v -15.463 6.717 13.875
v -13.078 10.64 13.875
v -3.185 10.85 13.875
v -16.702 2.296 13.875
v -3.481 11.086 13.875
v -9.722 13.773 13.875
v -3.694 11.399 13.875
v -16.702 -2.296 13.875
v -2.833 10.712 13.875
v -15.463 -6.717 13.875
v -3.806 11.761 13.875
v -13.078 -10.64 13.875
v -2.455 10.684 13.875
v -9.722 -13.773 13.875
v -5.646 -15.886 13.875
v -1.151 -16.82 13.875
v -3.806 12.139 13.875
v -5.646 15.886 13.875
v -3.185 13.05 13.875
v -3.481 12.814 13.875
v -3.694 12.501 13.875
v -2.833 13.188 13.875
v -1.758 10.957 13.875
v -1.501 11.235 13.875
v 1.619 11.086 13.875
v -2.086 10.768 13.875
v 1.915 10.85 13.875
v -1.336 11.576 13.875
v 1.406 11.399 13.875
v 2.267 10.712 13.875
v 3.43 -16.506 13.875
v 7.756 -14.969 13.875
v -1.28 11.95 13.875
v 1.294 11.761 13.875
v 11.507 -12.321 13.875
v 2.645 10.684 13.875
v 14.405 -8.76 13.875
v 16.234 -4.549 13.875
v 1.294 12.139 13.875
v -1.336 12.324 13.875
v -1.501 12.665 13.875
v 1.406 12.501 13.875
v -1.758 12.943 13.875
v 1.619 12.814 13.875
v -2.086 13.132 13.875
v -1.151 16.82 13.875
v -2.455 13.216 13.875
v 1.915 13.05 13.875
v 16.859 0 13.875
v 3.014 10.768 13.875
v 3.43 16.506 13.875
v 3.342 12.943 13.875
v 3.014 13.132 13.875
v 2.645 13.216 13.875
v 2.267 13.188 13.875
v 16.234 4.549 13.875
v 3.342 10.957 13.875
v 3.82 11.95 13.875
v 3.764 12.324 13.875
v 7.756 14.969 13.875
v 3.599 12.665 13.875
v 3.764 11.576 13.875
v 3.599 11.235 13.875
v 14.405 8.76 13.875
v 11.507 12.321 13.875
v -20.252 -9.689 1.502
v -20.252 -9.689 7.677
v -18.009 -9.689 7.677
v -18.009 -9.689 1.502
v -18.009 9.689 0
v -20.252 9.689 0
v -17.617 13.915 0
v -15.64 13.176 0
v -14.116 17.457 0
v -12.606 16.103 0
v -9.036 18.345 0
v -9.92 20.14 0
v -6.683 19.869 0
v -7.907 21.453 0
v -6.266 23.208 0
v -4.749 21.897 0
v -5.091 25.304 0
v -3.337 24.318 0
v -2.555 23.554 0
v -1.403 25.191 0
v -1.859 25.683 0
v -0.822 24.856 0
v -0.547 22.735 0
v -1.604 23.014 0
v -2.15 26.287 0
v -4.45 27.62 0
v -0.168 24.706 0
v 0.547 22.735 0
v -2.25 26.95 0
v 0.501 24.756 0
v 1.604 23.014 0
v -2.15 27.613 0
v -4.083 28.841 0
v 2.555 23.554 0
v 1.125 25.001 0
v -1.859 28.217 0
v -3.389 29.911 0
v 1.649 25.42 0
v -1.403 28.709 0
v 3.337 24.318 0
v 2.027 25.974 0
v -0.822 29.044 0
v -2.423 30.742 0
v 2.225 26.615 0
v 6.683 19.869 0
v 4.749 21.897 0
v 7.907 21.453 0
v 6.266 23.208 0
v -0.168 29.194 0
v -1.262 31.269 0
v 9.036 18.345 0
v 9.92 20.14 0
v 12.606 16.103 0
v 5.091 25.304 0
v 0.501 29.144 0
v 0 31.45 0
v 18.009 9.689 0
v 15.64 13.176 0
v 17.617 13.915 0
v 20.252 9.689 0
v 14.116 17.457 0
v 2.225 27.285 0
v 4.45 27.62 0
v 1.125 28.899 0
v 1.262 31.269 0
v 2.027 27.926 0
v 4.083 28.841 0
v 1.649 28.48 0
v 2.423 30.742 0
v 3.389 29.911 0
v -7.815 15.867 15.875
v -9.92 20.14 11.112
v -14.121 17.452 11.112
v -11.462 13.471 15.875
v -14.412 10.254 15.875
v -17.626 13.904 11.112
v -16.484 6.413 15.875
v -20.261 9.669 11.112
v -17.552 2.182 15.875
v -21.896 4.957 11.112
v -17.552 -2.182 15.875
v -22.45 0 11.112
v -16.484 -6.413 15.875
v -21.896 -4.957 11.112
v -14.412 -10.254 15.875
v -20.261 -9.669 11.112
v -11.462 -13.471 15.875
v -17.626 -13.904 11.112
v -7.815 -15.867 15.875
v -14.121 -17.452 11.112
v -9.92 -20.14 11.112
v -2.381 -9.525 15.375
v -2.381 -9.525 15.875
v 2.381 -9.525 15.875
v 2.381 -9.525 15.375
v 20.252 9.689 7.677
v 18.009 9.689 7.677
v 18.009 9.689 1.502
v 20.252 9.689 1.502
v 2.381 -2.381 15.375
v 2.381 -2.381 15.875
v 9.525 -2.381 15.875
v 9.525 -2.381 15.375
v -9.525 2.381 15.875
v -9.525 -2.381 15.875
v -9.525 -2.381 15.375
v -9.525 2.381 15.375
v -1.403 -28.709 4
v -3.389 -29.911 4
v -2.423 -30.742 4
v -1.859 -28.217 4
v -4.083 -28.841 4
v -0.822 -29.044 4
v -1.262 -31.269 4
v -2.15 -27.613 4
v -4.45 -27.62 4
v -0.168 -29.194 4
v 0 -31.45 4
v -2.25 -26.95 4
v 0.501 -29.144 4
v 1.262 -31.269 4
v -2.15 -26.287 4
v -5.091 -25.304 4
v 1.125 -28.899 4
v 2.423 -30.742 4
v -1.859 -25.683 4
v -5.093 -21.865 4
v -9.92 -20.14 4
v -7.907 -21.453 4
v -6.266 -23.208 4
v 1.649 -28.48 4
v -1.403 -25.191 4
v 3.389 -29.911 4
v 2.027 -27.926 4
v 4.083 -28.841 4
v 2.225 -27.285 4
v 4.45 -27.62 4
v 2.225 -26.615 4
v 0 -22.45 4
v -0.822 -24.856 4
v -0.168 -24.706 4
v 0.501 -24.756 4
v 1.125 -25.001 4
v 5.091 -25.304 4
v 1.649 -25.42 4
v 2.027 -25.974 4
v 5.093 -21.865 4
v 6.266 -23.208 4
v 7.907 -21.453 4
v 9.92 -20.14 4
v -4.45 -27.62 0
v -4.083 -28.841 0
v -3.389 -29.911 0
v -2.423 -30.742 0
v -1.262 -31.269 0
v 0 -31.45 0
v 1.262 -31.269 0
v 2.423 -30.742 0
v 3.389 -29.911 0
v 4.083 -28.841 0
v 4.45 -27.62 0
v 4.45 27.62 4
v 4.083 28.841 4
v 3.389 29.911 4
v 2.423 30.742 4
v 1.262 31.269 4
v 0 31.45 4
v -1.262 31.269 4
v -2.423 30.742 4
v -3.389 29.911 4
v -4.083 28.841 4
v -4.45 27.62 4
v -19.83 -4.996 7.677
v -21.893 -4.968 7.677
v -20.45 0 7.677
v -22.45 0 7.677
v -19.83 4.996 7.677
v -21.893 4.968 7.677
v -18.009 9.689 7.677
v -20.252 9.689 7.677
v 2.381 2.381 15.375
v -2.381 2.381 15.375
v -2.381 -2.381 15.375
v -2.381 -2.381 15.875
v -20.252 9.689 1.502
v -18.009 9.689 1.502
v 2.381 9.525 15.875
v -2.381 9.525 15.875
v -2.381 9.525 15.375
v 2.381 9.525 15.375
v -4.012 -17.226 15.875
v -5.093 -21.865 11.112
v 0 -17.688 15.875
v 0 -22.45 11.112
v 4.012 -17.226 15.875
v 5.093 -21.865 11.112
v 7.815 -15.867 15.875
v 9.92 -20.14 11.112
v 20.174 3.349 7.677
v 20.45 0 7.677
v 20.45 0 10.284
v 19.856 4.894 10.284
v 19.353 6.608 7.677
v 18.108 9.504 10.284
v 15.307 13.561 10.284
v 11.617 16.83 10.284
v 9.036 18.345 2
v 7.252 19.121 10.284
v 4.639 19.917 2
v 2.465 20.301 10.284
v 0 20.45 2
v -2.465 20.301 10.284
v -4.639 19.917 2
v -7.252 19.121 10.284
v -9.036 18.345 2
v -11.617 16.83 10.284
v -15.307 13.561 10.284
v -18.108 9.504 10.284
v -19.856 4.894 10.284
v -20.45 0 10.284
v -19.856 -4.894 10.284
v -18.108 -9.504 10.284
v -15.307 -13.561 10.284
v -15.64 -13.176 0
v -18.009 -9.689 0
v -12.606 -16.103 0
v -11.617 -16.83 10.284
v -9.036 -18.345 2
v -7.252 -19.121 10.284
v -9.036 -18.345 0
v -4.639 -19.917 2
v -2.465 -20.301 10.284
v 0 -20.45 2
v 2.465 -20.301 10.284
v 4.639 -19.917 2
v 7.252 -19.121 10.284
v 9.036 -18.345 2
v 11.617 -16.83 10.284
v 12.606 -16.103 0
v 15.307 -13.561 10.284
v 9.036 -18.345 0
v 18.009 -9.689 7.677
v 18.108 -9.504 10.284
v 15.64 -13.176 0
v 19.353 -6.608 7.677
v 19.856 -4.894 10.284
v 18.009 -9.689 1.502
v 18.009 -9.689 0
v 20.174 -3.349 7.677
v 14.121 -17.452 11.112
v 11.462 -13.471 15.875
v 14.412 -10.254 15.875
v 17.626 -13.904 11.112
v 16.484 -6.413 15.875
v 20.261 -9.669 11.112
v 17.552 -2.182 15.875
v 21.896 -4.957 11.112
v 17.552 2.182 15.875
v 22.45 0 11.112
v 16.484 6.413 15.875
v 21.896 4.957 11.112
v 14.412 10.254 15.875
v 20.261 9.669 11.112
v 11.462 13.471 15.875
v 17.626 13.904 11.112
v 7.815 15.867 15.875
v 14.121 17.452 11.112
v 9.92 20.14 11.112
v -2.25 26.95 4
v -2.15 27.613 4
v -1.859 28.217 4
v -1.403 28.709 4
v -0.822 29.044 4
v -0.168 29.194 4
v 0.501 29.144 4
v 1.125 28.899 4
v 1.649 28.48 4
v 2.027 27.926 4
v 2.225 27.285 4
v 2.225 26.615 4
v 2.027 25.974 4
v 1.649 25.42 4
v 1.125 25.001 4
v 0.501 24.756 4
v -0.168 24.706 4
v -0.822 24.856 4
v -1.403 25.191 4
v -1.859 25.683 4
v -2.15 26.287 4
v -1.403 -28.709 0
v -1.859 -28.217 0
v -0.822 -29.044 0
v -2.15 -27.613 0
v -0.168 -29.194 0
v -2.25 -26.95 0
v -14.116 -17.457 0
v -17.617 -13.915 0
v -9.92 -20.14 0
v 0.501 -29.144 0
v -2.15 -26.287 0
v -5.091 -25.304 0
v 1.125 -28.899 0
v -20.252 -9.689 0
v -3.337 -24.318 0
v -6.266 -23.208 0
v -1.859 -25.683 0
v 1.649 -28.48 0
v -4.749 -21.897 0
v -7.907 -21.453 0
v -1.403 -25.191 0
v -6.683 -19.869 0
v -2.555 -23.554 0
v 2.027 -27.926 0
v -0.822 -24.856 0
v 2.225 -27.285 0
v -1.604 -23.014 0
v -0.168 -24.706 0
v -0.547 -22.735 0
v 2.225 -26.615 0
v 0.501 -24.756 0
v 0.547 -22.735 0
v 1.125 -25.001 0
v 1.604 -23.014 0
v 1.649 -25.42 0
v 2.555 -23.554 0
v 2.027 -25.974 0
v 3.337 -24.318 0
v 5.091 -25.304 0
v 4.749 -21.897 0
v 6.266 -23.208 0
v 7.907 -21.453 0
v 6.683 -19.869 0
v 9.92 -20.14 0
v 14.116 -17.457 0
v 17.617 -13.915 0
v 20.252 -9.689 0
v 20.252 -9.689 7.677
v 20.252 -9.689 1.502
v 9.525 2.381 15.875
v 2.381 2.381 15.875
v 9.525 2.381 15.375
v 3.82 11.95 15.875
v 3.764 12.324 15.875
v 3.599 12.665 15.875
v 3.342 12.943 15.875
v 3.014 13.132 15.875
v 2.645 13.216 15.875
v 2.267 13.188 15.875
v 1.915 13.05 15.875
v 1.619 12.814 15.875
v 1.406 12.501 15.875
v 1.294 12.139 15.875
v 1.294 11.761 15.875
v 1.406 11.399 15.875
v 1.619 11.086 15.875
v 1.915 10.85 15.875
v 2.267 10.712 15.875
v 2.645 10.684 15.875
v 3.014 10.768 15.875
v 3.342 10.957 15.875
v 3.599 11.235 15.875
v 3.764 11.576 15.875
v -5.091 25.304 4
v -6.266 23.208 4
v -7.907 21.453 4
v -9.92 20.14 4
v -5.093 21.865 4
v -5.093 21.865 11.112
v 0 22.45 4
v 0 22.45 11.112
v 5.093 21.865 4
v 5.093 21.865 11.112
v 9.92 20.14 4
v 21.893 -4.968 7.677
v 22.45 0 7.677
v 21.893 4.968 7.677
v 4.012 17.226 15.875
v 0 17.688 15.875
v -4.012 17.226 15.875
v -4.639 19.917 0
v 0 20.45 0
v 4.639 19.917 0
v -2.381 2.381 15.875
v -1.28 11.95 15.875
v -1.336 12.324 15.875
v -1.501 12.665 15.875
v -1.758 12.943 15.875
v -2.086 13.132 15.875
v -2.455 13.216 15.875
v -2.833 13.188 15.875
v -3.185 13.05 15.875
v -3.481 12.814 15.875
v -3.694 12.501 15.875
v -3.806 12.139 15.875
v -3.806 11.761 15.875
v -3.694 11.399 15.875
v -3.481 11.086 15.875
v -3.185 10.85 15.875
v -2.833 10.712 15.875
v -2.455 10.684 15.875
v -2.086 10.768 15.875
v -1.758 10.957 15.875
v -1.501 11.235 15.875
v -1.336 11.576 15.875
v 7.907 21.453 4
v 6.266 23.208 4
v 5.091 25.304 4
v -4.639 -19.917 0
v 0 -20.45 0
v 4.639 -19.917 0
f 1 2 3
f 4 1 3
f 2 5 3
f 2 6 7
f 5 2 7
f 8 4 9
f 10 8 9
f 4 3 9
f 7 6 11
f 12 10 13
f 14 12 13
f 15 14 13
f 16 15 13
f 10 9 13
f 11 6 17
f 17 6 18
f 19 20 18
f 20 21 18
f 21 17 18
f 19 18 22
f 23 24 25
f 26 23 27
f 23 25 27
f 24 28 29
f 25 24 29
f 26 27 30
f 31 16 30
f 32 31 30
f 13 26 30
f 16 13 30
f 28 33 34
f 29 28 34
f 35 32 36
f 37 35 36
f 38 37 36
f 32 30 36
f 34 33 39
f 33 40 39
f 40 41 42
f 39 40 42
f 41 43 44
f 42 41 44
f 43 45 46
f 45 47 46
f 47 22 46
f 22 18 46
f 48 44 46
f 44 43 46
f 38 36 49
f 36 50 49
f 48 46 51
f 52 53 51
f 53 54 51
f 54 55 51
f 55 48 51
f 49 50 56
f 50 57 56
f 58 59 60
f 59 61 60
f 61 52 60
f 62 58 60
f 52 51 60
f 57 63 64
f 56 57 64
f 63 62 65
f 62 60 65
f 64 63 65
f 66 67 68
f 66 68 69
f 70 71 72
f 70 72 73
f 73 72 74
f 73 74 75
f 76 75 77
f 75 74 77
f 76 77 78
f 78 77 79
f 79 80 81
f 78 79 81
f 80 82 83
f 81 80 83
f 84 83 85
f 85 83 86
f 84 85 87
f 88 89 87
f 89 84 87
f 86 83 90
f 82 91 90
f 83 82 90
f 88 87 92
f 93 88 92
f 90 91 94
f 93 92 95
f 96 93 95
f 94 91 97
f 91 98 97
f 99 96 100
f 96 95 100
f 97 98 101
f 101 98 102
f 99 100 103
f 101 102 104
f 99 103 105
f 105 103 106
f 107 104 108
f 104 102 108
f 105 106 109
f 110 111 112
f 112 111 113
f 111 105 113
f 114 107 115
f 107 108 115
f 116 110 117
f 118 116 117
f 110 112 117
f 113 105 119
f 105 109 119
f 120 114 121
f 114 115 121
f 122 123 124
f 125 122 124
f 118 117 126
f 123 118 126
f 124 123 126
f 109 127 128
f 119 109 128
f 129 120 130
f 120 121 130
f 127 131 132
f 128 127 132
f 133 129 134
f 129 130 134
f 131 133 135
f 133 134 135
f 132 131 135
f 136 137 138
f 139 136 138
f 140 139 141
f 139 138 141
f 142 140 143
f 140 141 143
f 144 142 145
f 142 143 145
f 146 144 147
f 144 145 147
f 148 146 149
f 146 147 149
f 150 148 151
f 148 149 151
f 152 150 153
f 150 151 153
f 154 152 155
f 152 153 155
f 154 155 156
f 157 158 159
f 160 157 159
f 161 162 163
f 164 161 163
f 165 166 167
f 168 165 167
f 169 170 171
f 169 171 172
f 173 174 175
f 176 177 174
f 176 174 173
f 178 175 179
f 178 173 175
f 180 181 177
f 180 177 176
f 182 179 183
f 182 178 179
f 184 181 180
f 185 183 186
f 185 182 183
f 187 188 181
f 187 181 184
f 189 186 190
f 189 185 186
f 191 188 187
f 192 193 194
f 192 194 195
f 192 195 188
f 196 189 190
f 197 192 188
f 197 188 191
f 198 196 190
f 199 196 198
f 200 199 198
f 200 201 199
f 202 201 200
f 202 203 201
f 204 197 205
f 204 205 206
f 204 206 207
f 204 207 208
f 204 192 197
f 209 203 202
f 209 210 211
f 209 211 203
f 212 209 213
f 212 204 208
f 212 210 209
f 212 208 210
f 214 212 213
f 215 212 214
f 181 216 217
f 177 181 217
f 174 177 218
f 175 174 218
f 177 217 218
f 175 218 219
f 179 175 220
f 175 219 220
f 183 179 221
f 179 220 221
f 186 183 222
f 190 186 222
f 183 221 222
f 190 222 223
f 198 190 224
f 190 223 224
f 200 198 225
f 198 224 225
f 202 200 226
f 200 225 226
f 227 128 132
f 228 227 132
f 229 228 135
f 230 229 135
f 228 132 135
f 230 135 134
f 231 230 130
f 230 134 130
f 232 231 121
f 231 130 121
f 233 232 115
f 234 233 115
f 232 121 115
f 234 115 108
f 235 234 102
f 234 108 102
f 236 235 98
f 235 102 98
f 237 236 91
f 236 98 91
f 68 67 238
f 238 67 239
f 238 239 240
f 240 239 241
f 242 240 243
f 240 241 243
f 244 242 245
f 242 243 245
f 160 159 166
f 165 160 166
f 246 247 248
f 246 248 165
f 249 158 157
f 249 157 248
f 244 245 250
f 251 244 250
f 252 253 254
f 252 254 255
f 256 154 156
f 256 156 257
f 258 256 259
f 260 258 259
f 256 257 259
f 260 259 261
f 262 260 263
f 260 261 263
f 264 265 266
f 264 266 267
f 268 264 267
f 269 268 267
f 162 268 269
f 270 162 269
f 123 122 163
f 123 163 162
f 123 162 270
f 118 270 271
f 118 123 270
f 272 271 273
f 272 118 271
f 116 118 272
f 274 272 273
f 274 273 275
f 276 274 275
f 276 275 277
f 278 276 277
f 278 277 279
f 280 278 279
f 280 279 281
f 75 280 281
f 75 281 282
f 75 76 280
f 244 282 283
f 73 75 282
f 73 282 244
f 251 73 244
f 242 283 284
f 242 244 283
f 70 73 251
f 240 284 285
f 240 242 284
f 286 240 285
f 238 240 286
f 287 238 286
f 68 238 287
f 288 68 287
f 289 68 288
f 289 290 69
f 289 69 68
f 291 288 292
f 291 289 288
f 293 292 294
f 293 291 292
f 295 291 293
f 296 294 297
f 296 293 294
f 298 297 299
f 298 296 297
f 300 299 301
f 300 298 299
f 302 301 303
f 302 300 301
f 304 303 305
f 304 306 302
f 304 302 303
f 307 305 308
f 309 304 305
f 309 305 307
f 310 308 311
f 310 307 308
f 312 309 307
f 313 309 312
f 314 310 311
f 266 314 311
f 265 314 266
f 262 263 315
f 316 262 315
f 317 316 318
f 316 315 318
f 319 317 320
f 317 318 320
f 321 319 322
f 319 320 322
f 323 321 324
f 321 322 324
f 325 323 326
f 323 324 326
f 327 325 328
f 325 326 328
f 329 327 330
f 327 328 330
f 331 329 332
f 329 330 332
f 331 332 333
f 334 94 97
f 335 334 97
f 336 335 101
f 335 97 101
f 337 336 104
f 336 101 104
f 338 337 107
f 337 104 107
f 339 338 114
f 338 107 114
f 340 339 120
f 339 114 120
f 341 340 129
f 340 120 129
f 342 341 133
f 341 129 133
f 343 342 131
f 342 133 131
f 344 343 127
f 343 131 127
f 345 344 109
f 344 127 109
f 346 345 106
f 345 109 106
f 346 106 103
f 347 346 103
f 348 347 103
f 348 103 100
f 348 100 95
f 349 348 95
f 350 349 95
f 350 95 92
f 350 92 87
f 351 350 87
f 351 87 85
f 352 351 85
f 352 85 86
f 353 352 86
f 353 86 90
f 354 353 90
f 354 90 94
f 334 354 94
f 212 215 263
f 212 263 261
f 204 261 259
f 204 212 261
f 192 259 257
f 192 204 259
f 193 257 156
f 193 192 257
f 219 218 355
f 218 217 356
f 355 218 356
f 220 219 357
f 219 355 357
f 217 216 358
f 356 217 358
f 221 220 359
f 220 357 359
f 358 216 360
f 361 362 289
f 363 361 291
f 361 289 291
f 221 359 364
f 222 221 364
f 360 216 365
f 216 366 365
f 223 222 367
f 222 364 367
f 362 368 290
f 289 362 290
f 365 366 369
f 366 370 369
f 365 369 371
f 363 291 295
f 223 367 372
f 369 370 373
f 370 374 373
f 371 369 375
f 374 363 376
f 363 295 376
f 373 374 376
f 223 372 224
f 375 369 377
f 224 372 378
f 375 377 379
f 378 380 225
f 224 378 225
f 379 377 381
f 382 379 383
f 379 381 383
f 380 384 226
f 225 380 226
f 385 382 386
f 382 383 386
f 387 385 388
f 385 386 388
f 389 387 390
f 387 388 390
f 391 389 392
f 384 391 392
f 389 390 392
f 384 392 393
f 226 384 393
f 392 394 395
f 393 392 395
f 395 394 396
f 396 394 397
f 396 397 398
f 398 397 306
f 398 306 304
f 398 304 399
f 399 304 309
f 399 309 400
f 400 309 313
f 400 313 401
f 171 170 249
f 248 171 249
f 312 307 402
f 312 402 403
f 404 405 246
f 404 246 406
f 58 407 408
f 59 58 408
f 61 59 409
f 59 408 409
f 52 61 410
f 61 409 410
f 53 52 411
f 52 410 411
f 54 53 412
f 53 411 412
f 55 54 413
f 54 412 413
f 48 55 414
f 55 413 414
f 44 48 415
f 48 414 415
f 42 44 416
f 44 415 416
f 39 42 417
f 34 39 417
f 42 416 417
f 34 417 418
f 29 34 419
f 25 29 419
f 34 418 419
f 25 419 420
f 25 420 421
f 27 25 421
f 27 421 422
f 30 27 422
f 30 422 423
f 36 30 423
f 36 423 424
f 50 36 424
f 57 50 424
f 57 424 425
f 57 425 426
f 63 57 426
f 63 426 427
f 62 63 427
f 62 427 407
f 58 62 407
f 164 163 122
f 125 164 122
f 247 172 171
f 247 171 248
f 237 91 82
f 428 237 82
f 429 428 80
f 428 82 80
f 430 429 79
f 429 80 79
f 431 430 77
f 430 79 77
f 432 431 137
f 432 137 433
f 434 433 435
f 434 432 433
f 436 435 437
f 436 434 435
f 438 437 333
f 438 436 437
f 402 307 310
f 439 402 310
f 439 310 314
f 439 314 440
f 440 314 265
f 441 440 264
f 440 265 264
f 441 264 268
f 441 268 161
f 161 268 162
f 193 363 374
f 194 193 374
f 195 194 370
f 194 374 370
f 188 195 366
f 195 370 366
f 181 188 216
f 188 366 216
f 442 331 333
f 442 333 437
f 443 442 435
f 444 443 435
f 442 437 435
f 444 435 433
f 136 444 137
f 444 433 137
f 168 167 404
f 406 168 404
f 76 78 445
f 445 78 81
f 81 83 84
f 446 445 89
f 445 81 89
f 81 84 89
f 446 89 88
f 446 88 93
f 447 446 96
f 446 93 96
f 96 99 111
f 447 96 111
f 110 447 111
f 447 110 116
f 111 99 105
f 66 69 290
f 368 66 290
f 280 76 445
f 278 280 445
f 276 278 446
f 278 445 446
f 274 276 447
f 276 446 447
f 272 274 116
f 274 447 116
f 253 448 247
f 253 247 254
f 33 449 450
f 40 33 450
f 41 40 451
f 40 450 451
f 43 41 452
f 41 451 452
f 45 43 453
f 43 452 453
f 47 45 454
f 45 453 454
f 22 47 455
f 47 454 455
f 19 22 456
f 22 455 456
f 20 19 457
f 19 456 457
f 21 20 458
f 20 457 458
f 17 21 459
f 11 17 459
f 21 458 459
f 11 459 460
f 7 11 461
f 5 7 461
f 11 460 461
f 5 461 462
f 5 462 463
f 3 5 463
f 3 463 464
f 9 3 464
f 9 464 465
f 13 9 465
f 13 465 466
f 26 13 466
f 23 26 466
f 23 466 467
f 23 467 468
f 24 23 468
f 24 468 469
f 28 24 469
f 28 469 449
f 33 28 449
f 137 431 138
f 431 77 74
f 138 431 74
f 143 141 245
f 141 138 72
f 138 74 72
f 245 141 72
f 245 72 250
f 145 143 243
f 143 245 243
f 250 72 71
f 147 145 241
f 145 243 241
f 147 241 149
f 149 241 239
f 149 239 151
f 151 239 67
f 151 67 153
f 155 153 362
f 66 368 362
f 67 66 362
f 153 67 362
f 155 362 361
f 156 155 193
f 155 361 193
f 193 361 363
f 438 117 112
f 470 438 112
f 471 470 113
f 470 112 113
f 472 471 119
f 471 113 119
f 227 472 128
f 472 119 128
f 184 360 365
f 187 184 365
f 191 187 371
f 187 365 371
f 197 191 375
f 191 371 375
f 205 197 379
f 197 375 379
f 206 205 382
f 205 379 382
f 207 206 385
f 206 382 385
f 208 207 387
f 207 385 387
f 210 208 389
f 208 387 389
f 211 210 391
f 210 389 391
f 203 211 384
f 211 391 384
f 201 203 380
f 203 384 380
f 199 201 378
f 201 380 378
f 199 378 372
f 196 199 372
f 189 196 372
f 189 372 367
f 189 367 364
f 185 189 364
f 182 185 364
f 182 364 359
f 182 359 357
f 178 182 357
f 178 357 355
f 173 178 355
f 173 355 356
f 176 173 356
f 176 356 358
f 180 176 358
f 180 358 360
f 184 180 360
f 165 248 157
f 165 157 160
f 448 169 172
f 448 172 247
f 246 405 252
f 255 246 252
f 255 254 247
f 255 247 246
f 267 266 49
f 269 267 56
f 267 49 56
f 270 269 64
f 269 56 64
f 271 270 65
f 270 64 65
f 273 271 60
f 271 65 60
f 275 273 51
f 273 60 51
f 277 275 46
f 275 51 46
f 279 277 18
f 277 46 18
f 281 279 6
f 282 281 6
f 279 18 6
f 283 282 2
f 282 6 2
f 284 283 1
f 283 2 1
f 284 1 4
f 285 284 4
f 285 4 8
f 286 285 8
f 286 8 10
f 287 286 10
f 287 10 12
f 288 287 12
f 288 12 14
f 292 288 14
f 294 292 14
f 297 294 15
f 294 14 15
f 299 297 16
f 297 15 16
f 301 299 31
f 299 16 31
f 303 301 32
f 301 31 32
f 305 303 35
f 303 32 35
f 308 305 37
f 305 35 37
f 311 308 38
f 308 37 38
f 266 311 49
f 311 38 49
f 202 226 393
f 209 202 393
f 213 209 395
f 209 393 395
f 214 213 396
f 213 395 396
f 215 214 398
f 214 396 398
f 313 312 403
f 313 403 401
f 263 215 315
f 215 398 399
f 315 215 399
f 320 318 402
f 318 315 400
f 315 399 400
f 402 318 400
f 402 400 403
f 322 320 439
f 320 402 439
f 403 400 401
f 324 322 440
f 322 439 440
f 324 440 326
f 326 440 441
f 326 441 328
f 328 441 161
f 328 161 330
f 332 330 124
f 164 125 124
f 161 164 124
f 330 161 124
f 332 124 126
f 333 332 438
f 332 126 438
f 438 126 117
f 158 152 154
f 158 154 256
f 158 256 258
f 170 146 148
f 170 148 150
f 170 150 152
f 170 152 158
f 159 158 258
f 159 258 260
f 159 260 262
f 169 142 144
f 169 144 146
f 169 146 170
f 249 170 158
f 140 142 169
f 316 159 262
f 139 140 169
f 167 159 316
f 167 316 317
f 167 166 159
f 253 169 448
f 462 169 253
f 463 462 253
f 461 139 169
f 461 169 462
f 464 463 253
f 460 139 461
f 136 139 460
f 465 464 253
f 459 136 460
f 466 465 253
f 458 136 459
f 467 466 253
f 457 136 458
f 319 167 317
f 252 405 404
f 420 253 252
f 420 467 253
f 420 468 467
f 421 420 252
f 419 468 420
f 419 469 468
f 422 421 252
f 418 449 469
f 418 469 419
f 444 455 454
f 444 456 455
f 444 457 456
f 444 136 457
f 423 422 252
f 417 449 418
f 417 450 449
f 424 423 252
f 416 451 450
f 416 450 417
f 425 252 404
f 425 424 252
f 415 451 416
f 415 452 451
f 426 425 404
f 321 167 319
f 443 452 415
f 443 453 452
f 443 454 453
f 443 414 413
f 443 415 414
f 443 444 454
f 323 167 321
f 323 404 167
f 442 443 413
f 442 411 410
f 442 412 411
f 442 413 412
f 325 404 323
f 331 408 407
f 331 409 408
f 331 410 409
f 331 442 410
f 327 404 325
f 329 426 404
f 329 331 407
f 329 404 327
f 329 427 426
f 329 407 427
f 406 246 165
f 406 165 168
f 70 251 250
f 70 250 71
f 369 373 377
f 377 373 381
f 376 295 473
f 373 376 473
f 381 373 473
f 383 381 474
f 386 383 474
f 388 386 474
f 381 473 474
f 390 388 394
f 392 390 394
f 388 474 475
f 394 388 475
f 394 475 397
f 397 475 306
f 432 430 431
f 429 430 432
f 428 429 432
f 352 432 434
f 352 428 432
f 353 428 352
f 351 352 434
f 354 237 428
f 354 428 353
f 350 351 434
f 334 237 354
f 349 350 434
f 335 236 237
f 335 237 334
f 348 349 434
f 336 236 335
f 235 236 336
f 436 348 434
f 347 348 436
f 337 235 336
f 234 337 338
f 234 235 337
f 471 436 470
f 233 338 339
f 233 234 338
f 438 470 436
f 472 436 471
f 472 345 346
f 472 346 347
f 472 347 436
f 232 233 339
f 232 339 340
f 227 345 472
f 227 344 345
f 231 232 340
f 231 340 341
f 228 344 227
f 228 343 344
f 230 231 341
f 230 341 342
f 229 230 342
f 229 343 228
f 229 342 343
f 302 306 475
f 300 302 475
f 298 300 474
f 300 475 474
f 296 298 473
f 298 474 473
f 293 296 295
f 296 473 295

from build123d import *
from build123d.topology import SkipClean

# Parameters (mm, degrees)
BOSS_EXTRUDE1_DEPTH     = 15.875
CUT_EXTRUDE2_START      = -11.875
CUT_EXTRUDE2_DEPTH      = 11.875
M4_CLEARANCE_HOLE1_D    = 4.5
CHAMFER1_SIZE           = 4.7625
SHELL1_OUTLINE_R        = 20.45
SHELL1_DEPTH            = 10.284072775
SHELL1_2_DEPTH          = 2
BOSS_EXTRUDE2_START     = 2
BOSS_EXTRUDE2_DEPTH     = 2
SKETCH7_W               = 7.14375
SKETCH7_H               = 4.7625
SKETCH7_W_2             = 4.7625
SKETCH7_H_2             = 7.14375
CUT_EXTRUDE5_DEPTH      = 0.5
CUT_EXTRUDE7_DEPTH      = 42.774640932
CUT_EXTRUDE7_DEPTH_BACK = 42.774640932
SKETCH9_W               = 6.175
SKETCH9_H               = 19.378
SKETCH9_W_2             = 3.175
SKETCH9_H_2             = 16.378
SKETCH9_W_3             = 1.5018
SKETCH12_R              = 1.27
CUT_EXTRUDE10_DEPTH     = 42.774640932


with BuildPart() as part:
    # Sketch1 → Boss-Extrude1 (new body)
    with BuildSketch(Plane.XY):
        with BuildLine():
            ThreePointArc((-9.919608253, 20.139609532), (-22.45, 0), (-9.919608253, -20.139609532))
            ThreePointArc((-9.919608253, -20.139609532), (-6.265793461, -23.208178662), (-4.449768206, -27.62049453))
            ThreePointArc((-4.449768206, -27.62049453), (0, -31.45), (4.449768206, -27.62049453))
            ThreePointArc((4.449768206, -27.62049453), (6.265793461, -23.208178662), (9.919608253, -20.139609532))
            ThreePointArc((9.919608253, -20.139609532), (22.45, 0), (9.919608253, 20.139609532))
            ThreePointArc((9.919608253, 20.139609532), (6.265793461, 23.208178662), (4.449768206, 27.62049453))
            ThreePointArc((4.449768206, 27.62049453), (0, 31.45), (-4.449768206, 27.62049453))
            ThreePointArc((-4.449768206, 27.62049453), (-6.265793461, 23.208178662), (-9.919608253, 20.139609532))
        make_face()
    extrude(amount=BOSS_EXTRUDE1_DEPTH)

    # Sketch3 → Cut-Extrude2 (cut)
    with SkipClean():  # the faces are left unmerged after this step: merging them gives an invalid solid
        with BuildSketch(Plane.XY.offset(15.875).offset(CUT_EXTRUDE2_START)):
            with BuildLine():
                ThreePointArc((-4.449768206, 27.62049453), (-6.265793461, 23.208178662), (-9.919608253, 20.139609532))
                ThreePointArc((-9.919608253, 20.139609532), (0, 22.45), (9.919608253, 20.139609532))
                ThreePointArc((9.919608253, 20.139609532), (6.265793461, 23.208178662), (4.449768206, 27.62049453))
                ThreePointArc((4.449768206, 27.62049453), (0, 31.45), (-4.449768206, 27.62049453))
            make_face()
            with BuildLine():
                ThreePointArc((9.919608253, -20.139609532), (0, -22.45), (-9.919608253, -20.139609532))
                ThreePointArc((-9.919608253, -20.139609532), (-6.265793461, -23.208178662), (-4.449768206, -27.62049453))
                ThreePointArc((-4.449768206, -27.62049453), (0, -31.45), (4.449768206, -27.62049453))
                ThreePointArc((4.449768206, -27.62049453), (6.265793461, -23.208178662), (9.919608253, -20.139609532))
            make_face()
        extrude(amount=CUT_EXTRUDE2_DEPTH, mode=Mode.SUBTRACT)

    # M4 Clearance Hole1 (through all)
    with Locations(Plane.XY.offset(4)):
        with Locations((0, -26.95), (0, 26.95)):
            Hole(M4_CLEARANCE_HOLE1_D / 2)

    # Chamfer1
    chamfer1_edges = [part.edges().sort_by_distance(p)[0] for p in [
        (22.45, 0, 15.875),
    ]]
    chamfer(chamfer1_edges, length=CHAMFER1_SIZE)

    # Shell1: read off the stored shape, not the designer's step
    # Shell1 outline → Shell1 (cut)
    with SkipClean():  # the faces are left unmerged after this step: merging them gives an invalid solid
        with BuildSketch(Plane.XY):
            Circle(SHELL1_OUTLINE_R)
        extrude(amount=SHELL1_DEPTH, mode=Mode.SUBTRACT)

    # Shell1 2 outline → Shell1 2 (cut)
    with SkipClean():  # the faces are left unmerged after this step: merging them gives an invalid solid
        with BuildSketch(Plane.XY):
            with BuildLine():
                ThreePointArc((-3.336769132, -24.317800965), (0, -22.7), (3.336769132, -24.317800965))
                ThreePointArc((3.336769132, -24.317800965), (5.656595992, -20.826114024), (9.035901505, -18.345434963))
                ThreePointArc((9.035901505, -18.345434963), (0, -20.45), (-9.035901505, -18.345434963))
                ThreePointArc((-9.035901505, -18.345434963), (-5.656595992, -20.826114024), (-3.336769132, -24.317800965))
            make_face()
            with BuildLine():
                ThreePointArc((-3.336769132, 24.317800965), (-5.656595992, 20.826114024), (-9.035901505, 18.345434963))
                ThreePointArc((-9.035901505, 18.345434963), (0, 20.45), (9.035901505, 18.345434963))
                ThreePointArc((9.035901505, 18.345434963), (5.656595992, 20.826114024), (3.336769132, 24.317800965))
                ThreePointArc((3.336769132, 24.317800965), (0, 22.7), (-3.336769132, 24.317800965))
            make_face()
        extrude(amount=SHELL1_2_DEPTH, mode=Mode.SUBTRACT)

    # Shell1 3 outline → Shell1 3 (revolve, cut)
    with SkipClean():  # the faces are left unmerged after this step: merging them gives an invalid solid
        with BuildSketch(Plane.XZ):
            Polygon((16.859072875, 13.875), (0, 13.875), (0, 10.284072775), (20.45, 10.284072775), align=None)
        revolve(axis=Axis((0, 0, 0), (0, 0, 1)), mode=Mode.SUBTRACT)

    # Sketch6 → Boss-Extrude2 (add)
    with SkipClean():  # the faces are left unmerged after this step: merging them gives an invalid solid
        with BuildSketch(Plane(origin=(0, 0, 2), x_dir=(-1, 0, 0), z_dir=(0, 0, -1)).offset(BOSS_EXTRUDE2_START)):
            with BuildLine():
                ThreePointArc((3.336769132, -24.317800965), (0, -22.7), (-3.336769132, -24.317800965))
                ThreePointArc((-3.336769132, -24.317800965), (-5.656595992, -20.826114024), (-9.035901505, -18.345434963))
                ThreePointArc((-9.035901505, -18.345434963), (0, -20.45), (9.035901505, -18.345434963))
                ThreePointArc((9.035901505, -18.345434963), (5.656595992, -20.826114024), (3.336769132, -24.317800965))
            make_face()
            with BuildLine():
                ThreePointArc((-9.035901505, 18.345434963), (-5.656595992, 20.826114024), (-3.336769132, 24.317800965))
                ThreePointArc((-3.336769132, 24.317800965), (0, 22.7), (3.336769132, 24.317800965))
                ThreePointArc((3.336769132, 24.317800965), (5.656595992, 20.826114024), (9.035901505, 18.345434963))
                ThreePointArc((9.035901505, 18.345434963), (0, 20.45), (-9.035901505, 18.345434963))
            make_face()
        extrude(amount=-BOSS_EXTRUDE2_DEPTH)

    # Sketch7 → Cut-Extrude5 (cut)
    with SkipClean():  # the faces are left unmerged after this step: merging them gives an invalid solid
        with BuildSketch(Plane.XY.offset(15.875)):
            with Locations((-5.953125, 0)):
                Rectangle(SKETCH7_W, SKETCH7_H)
            Rectangle(SKETCH7_W_2, SKETCH7_H)
            with Locations((5.953125, 0)):
                Rectangle(SKETCH7_W, SKETCH7_H)
            with Locations((0, -5.953125)):
                Rectangle(SKETCH7_W_2, SKETCH7_H_2)
            with Locations((0, 5.953125)):
                Rectangle(SKETCH7_W_2, SKETCH7_H_2)
        extrude(amount=-CUT_EXTRUDE5_DEPTH, mode=Mode.SUBTRACT)

    # Sketch9 → Cut-Extrude7 (cut, two sides: drawn at the far end of the back side and taken through both)
    # profile 1 of 3: a face of its own
    with SkipClean():  # the faces are left unmerged after this step: merging them gives an invalid solid
        with BuildSketch(Plane(origin=(0, 0, 0), x_dir=(0, 0, -1), z_dir=(1, 0, 0)).offset(-CUT_EXTRUDE7_DEPTH_BACK)):
            with Locations((-4.5893, 0)):
                Rectangle(SKETCH9_W, SKETCH9_H)
            with Locations((-4.5893, 0)):
                Rectangle(SKETCH9_W_2, SKETCH9_H_2, mode=Mode.SUBTRACT)
        # profile 2 of 3: a face of its own
        with BuildSketch(Plane(origin=(0, 0, 0), x_dir=(0, 0, -1), z_dir=(1, 0, 0)).offset(-CUT_EXTRUDE7_DEPTH_BACK)):
            with Locations((-0.7509, 0)):
                Rectangle(SKETCH9_W_3, SKETCH9_H)
        # profile 3 of 3: a face of its own
        with BuildSketch(Plane(origin=(0, 0, 0), x_dir=(0, 0, -1), z_dir=(1, 0, 0)).offset(-CUT_EXTRUDE7_DEPTH_BACK)):
            with Locations((-4.5893, 0)):
                Rectangle(SKETCH9_W_2, SKETCH9_H_2)
        extrude(amount=CUT_EXTRUDE7_DEPTH + CUT_EXTRUDE7_DEPTH_BACK, mode=Mode.SUBTRACT)

    # Sketch12 → Cut-Extrude10 (cut, through all)
    with SkipClean():  # the faces are left unmerged after this step: merging them gives an invalid solid
        with BuildSketch(Plane.XY.offset(15.875)):
            with Locations((-2.55, 11.95)):
                Circle(SKETCH12_R)
            with Locations((2.55, 11.95)):
                Circle(SKETCH12_R)
        extrude(amount=-CUT_EXTRUDE10_DEPTH, mode=Mode.SUBTRACT)


solid = part.part
